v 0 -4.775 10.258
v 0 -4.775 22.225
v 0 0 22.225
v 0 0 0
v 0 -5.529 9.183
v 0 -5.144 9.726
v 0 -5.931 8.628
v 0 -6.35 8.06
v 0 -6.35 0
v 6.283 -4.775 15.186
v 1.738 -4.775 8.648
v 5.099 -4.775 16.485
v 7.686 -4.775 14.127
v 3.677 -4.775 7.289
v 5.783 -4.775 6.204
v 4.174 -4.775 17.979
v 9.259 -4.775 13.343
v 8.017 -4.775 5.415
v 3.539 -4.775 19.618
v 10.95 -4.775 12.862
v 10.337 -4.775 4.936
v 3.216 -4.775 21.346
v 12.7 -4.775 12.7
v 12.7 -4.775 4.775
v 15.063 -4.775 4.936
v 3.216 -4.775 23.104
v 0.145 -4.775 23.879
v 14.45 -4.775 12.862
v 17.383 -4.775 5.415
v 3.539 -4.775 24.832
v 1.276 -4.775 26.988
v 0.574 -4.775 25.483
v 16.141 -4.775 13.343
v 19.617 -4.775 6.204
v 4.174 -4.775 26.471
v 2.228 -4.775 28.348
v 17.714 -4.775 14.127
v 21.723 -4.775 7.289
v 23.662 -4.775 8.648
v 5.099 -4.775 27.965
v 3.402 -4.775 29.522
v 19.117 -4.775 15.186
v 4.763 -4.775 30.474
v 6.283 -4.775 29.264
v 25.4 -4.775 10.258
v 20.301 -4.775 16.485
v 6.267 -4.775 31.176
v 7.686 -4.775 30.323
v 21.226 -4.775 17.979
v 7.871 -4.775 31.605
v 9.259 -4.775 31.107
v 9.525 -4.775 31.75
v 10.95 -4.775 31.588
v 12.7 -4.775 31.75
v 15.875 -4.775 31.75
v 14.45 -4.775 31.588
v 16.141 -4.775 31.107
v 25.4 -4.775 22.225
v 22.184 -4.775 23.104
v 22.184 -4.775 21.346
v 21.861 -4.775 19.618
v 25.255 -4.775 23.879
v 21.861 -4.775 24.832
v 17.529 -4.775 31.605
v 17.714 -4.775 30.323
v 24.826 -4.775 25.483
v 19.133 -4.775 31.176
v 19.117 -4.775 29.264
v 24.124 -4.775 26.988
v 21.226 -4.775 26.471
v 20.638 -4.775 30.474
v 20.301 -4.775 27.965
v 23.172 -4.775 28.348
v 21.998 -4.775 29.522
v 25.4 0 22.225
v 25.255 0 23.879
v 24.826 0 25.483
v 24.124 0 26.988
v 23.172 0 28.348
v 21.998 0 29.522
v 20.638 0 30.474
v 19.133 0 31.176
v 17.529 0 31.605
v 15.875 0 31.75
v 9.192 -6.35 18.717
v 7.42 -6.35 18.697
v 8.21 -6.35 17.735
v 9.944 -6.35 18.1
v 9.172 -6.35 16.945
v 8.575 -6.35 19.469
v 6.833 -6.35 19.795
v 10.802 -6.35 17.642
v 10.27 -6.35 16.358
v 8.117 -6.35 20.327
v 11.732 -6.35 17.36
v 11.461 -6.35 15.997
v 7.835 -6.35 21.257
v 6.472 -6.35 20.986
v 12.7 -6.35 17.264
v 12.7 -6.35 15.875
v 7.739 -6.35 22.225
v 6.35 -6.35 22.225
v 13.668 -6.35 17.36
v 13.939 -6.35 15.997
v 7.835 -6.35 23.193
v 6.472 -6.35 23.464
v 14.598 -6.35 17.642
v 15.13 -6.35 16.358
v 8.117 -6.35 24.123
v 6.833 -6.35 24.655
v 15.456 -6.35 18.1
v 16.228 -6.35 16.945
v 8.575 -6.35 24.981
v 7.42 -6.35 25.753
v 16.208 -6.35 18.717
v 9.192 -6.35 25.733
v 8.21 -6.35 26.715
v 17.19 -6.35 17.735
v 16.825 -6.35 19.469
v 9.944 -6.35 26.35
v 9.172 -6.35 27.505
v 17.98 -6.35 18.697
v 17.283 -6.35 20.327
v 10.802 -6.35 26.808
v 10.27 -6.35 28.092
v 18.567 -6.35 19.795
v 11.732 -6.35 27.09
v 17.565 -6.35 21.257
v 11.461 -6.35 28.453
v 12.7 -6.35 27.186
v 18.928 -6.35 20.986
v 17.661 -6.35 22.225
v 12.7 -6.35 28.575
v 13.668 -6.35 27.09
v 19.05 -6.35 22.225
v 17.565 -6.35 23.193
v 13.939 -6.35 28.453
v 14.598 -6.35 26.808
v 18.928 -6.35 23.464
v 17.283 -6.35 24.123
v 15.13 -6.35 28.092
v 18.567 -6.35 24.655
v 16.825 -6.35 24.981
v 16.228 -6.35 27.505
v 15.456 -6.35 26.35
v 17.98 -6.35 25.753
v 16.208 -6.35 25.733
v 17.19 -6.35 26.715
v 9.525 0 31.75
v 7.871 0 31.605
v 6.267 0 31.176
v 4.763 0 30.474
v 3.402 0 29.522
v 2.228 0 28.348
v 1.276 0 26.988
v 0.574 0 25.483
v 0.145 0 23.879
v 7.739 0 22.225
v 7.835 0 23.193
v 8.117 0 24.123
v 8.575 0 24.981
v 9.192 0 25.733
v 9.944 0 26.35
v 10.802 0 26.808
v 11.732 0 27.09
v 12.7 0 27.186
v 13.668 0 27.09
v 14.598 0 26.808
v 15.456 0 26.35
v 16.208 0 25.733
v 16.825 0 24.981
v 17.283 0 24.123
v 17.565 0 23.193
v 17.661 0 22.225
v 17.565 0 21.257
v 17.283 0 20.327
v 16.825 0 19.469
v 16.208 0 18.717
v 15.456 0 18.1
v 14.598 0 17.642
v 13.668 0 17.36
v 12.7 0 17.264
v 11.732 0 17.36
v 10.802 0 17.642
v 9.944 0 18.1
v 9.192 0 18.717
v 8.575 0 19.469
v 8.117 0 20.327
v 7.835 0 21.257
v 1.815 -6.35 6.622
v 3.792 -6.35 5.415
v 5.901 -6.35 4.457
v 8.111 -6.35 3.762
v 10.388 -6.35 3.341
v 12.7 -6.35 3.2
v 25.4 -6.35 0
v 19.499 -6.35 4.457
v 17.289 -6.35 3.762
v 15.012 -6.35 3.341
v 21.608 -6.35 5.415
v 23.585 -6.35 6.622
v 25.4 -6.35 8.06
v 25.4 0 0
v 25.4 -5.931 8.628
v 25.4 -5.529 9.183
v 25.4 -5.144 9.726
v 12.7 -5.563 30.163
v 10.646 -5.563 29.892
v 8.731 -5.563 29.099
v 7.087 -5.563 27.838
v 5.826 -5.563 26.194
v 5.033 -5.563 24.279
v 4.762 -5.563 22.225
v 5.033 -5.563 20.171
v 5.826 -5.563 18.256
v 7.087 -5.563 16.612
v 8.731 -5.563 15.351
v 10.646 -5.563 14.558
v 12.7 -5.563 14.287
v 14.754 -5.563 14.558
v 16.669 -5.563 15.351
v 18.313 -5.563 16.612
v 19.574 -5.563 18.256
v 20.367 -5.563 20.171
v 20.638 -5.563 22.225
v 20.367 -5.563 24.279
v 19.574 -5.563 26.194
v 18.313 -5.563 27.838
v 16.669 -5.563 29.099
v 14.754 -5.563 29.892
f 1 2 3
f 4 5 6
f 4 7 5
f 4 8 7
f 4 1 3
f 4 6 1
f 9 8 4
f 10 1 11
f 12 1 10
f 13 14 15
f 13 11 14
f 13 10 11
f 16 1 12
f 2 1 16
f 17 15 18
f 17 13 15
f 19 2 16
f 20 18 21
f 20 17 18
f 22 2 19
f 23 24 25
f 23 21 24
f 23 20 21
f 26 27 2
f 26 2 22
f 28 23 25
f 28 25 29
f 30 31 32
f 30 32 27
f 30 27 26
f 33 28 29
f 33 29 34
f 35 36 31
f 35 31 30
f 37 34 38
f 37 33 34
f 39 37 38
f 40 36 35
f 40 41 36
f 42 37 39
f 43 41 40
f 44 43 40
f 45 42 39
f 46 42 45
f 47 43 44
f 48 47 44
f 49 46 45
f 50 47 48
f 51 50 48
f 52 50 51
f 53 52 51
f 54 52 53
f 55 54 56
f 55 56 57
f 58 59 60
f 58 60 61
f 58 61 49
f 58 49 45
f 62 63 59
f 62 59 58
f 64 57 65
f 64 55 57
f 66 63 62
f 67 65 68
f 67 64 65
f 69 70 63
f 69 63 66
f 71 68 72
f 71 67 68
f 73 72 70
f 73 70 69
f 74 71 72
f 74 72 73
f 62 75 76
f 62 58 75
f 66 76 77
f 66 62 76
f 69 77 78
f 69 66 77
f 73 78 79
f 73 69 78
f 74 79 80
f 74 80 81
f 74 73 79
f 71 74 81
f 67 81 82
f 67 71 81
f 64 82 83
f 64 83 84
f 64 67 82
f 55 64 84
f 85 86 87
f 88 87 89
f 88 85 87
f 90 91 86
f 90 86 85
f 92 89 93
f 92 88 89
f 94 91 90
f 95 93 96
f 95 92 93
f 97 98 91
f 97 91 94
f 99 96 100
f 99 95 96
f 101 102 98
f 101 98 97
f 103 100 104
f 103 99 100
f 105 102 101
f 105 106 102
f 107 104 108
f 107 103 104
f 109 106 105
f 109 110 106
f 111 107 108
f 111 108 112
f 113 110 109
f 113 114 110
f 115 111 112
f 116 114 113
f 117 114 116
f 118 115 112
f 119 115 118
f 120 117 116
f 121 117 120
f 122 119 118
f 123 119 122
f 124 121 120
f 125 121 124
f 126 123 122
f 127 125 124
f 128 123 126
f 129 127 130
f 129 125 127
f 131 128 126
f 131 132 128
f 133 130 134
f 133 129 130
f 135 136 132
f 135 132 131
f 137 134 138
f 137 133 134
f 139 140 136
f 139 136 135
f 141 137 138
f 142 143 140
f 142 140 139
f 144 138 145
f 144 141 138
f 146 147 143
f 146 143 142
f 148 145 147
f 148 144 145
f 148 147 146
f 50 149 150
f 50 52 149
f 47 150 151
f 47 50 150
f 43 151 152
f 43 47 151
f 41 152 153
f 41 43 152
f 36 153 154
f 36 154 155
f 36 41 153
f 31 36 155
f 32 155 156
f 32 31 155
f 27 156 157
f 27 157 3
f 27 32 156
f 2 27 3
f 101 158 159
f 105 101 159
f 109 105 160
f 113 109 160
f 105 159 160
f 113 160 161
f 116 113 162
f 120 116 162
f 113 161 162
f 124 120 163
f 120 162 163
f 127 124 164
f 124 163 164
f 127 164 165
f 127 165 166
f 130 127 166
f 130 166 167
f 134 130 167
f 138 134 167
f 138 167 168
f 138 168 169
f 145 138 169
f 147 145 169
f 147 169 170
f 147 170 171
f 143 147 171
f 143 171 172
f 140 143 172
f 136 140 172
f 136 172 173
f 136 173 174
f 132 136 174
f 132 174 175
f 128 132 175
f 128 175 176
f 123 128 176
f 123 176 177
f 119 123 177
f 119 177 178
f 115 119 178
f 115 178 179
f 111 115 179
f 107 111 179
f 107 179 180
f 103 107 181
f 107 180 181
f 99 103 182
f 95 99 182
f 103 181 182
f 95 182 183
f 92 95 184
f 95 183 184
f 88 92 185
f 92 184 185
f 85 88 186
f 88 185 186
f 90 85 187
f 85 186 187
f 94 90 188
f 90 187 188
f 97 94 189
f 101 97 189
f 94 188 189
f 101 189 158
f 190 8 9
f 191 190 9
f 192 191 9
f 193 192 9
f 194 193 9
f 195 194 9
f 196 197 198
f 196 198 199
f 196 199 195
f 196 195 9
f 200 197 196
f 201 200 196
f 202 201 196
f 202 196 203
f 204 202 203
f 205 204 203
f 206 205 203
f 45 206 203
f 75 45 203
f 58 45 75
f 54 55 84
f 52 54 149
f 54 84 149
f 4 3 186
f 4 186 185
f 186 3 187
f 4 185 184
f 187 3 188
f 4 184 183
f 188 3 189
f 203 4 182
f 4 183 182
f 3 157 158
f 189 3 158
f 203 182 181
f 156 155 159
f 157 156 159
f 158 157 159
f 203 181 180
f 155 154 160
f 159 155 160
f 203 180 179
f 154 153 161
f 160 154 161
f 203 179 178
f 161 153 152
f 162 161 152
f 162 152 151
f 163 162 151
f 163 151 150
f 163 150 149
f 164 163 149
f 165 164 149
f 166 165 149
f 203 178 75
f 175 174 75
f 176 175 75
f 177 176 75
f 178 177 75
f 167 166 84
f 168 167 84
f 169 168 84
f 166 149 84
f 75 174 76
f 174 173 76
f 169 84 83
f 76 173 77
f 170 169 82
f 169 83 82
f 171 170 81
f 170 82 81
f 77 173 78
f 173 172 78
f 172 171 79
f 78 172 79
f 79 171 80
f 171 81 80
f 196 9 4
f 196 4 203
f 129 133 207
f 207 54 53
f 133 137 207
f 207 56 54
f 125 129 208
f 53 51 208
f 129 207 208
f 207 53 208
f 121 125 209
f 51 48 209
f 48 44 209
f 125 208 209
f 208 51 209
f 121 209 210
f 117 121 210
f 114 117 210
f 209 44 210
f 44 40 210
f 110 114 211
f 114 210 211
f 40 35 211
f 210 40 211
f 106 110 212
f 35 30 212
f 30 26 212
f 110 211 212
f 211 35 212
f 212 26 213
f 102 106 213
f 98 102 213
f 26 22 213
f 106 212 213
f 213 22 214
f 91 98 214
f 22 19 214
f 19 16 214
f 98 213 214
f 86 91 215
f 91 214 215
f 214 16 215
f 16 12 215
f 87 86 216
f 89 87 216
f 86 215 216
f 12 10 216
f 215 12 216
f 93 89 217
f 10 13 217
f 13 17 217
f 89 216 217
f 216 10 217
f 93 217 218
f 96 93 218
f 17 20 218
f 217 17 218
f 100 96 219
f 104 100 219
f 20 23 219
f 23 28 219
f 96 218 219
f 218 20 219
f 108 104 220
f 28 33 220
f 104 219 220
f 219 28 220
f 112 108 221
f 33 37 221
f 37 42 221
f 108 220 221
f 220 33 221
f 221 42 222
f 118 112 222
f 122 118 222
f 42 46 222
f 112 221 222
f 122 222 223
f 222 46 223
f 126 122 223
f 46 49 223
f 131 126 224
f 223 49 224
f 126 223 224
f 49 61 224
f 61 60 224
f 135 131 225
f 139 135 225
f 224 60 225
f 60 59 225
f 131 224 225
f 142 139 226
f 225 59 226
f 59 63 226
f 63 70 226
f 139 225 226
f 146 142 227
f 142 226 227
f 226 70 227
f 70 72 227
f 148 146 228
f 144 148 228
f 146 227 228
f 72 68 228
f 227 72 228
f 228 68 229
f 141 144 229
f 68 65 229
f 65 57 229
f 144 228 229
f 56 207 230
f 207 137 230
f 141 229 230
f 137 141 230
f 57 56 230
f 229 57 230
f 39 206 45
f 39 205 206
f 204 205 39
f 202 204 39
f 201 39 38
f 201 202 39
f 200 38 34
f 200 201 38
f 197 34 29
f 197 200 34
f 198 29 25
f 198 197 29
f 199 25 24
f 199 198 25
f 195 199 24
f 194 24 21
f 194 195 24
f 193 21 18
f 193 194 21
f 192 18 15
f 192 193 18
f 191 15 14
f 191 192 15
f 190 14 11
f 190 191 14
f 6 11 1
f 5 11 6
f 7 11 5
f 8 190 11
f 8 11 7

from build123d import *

# Parameters (mm, degrees)
F0_R     = 4.953
F1_DEPTH = 4.7752
F2_DEPTH = 6.35
F4_DEPTH = 1.5748
F5_SIZE2 = 1.57479
F5_SIZE  = 3.17499
F6_SIZE  = 1.57479
F7_R     = 9.525
F8_R     = 4.953
F9_DEPTH = 6.35
F11_D    = 9.92124


# Not quite as in the source:
# - a fillet or chamfer is up to 0.001 mm smaller than in the source, because OpenCascade refuses the exact size


with BuildPart() as f1:
    # F0 (on Front) → F1 (new body)
    with BuildSketch(Plane.XZ):
        Polygon((0, 31.75), (0, 0), (25.4, 0), (25.4, 31.75), (12.7, 31.75), align=None)
        with BuildLine():
            ThreePointArc((22.225, 22.225), (5.9648079092, 15.4898079092), (12.7, 31.75))
            ThreePointArc((12.7, 31.75), (19.4351920908, 28.9601920908), (22.225, 22.225))
        make_face(mode=Mode.SUBTRACT)
        with BuildLine():
            ThreePointArc((22.225, 22.225), (19.4351920908, 28.9601920908), (12.7, 31.75))
            ThreePointArc((12.7, 31.75), (5.9648079092, 15.4898079092), (22.225, 22.225))
        make_face()
        with Locations((12.7, 22.225)):
            Circle(F0_R, mode=Mode.SUBTRACT)
    extrude(amount=F1_DEPTH)

    # F0 (on Front) → F2 (join)
    with BuildSketch(Plane.XZ):
        with BuildLine():
            ThreePointArc((22.225, 22.225), (19.4351920908, 28.9601920908), (12.7, 31.75))
            ThreePointArc((12.7, 31.75), (5.9648079092, 15.4898079092), (22.225, 22.225))
        make_face()
        with Locations((12.7, 22.225)):
            Circle(F0_R, mode=Mode.SUBTRACT)
    extrude(amount=F2_DEPTH)

    # F3 (on face) → F4 (join, through all)
    with BuildSketch(Plane.XZ.offset(6.35)):
        with BuildLine():
            ThreePointArc((25.4, 10.2581491177), (12.7, 4.7752), (0, 10.2581491177))
            Line((0, 10.2581491177), (0, 0))
            Line((0, 0), (25.4, 0))
            Line((25.4, 0), (25.4, 10.2581491177))
        make_face()
    extrude(amount=-F4_DEPTH)

    # F5 (size 3.175 and 1.5748 in the source; OpenCascade refuses exactly that, so slightly less here)
    f5_edges = [f1.edges().sort_by_distance(p)[0] for p in [
        (3.175, -6.35, 22.225),
    ]]
    f5_side = f1.faces().sort_by_distance((3.444408, -6.35, 22.225))[0]
    chamfer(f5_edges, length=F5_SIZE, length2=F5_SIZE2, reference=f5_side)

    # F6 (size 1.5748 in the source; OpenCascade refuses exactly that, so slightly less here)
    f6_edges = [f1.edges().sort_by_distance(p)[0] for p in [
        (12.7, -6.35, 4.7752),
    ]]
    chamfer(f6_edges, length=F6_SIZE)

    # F7
    f7_edges = [f1.edges().sort_by_distance(p)[0] for p in [
        (0, -2.3876, 31.75),
        (25.4, -2.3876, 31.75),
    ]]
    fillet(f7_edges, radius=F7_R)

    # F8 (on face) → F9 (join, through all)
    with BuildSketch(Plane.XZ.offset(6.35)):
        with Locations((12.7, 22.225)):
            Circle(F8_R)
    extrude(amount=-F9_DEPTH)

    # F11 (through all)
    with Locations(Plane.XZ.offset(6.35)):
        with Locations((12.7, 22.225)):
            Hole(F11_D / 2)


solid = f1.part
